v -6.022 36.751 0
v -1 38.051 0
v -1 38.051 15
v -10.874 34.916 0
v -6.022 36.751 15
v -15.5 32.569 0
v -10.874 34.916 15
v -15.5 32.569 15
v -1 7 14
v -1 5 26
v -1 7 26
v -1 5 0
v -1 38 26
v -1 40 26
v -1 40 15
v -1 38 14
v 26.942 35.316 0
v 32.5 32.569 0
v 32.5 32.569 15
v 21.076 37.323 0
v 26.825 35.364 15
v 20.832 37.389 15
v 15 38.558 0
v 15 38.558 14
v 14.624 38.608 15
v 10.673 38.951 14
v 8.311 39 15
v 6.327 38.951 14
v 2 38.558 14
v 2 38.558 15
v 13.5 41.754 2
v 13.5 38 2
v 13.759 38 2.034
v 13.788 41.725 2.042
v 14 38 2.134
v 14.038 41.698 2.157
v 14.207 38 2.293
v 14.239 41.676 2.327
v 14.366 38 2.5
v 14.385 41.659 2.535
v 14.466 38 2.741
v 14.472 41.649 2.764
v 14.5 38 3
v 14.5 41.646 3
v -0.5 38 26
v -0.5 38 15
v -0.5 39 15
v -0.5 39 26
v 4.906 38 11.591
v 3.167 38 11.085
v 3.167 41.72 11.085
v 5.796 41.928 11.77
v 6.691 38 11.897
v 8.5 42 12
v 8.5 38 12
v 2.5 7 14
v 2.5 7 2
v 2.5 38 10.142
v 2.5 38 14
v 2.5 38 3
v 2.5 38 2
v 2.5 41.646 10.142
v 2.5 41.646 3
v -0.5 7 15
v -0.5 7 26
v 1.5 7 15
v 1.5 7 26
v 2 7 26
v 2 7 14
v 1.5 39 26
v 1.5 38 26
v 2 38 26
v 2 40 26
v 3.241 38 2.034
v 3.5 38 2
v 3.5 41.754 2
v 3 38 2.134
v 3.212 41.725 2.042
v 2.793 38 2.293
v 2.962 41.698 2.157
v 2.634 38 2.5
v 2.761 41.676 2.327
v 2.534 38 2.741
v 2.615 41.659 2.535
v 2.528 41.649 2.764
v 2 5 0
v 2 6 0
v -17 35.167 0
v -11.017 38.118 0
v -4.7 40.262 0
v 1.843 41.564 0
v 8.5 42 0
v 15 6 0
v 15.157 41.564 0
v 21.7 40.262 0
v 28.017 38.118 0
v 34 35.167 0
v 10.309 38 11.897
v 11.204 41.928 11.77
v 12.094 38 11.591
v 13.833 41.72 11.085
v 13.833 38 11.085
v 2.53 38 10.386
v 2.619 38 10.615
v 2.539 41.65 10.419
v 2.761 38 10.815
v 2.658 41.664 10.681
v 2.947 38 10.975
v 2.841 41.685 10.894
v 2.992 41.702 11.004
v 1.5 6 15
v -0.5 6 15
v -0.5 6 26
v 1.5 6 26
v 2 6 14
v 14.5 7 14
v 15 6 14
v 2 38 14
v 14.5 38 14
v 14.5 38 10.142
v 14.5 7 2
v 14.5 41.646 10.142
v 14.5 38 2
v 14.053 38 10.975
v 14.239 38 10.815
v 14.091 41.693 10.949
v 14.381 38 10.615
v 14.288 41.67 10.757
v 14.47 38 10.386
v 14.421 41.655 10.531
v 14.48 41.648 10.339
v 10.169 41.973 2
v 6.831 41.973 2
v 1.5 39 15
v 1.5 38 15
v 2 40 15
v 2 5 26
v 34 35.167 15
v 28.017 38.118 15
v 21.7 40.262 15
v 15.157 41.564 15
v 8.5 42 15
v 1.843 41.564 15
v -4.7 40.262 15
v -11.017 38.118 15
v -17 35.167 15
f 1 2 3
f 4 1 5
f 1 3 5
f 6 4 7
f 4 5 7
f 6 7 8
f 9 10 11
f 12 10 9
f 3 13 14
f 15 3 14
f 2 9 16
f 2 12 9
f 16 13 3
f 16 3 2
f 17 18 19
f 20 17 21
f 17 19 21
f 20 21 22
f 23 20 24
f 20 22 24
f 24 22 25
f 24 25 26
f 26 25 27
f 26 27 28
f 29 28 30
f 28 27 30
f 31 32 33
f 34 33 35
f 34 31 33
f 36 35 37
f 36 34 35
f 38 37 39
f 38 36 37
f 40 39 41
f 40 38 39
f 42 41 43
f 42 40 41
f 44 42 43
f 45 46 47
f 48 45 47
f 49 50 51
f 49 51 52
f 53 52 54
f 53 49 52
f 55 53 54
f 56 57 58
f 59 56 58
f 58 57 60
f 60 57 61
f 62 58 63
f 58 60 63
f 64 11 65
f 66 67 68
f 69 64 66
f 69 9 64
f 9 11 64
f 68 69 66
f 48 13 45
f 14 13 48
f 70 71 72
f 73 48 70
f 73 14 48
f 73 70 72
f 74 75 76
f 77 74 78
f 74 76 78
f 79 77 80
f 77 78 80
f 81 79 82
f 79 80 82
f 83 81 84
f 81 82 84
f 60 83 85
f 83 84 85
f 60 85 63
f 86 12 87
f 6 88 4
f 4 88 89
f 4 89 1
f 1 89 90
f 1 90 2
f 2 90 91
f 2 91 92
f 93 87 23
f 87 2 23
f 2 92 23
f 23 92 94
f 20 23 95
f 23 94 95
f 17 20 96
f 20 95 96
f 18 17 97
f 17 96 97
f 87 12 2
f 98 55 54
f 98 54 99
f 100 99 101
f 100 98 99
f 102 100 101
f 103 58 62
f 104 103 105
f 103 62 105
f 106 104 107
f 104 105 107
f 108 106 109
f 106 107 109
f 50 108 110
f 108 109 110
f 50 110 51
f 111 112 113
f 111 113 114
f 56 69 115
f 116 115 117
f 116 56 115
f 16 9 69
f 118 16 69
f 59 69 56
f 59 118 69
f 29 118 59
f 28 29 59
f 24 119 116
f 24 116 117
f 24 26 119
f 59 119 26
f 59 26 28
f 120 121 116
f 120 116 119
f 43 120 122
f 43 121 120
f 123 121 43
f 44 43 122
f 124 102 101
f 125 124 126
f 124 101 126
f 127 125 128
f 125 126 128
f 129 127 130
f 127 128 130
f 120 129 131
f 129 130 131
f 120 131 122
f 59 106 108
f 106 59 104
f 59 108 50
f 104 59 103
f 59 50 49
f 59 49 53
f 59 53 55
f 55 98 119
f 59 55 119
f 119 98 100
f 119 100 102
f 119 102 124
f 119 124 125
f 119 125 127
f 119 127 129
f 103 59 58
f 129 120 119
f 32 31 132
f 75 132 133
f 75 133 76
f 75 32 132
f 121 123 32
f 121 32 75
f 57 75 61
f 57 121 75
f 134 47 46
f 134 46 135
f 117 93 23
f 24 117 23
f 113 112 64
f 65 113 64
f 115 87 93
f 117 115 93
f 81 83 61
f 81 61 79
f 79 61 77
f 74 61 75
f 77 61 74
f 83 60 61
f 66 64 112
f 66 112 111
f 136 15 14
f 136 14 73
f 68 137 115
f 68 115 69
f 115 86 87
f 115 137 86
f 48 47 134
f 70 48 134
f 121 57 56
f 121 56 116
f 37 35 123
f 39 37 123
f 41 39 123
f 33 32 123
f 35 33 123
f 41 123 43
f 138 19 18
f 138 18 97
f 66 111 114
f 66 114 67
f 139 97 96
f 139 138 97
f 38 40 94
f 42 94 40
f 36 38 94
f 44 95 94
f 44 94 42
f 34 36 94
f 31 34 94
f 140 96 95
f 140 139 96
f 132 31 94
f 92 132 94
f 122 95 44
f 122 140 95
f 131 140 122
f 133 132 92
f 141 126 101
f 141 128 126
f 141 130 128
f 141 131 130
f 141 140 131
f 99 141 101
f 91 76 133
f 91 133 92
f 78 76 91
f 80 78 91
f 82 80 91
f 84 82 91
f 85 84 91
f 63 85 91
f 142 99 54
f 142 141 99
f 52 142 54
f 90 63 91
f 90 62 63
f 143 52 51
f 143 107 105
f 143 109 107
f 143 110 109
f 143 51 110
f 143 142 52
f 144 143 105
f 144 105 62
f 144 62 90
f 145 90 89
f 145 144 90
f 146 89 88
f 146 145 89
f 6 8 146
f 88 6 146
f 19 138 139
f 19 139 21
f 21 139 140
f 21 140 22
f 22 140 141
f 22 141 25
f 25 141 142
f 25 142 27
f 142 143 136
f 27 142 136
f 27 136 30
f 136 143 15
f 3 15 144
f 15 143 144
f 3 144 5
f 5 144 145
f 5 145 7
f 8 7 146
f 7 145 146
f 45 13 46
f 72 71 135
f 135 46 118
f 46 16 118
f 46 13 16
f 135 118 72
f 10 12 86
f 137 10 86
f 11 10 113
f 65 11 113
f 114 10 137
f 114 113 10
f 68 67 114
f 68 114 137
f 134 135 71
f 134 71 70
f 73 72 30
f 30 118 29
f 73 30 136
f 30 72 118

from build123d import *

# Parameters (mm, degrees)
BOX004_W                    = 3
BOX004_H                    = 31
BOX004_DEPTH                = 14
BOX003_W                    = 2
BOX003_H                    = 33
BOX003_DEPTH                = 11.2
BOX002_W                    = 3
BOX002_H                    = 35
BOX002_DEPTH                = 26
EXTRUDE_DEPTH               = 5
EXTRUDE001_DEPTH            = 5
THICKNESS_T                 = 1
BOX_W                       = 12
BOX_H                       = 31
BOX_DEPTH                   = 15
BOX001_W                    = 13
BOX001_H                    = 34
BOX001_DEPTH                = 14
CYLINDER001_W               = 48
CYLINDER001_H               = 15
CYLINDER001_ANGLE           = 60
CYLINDER001_PLACEMENT_ANGLE = 60
CYLINDER_W                  = 51
CYLINDER_H                  = 15
CYLINDER_ANGLE              = 60
CYLINDER_PLACEMENT_ANGLE    = 60


with BuildPart() as slot_wall_cutout2:
    # Box004 → Box004 (new body)
    with BuildSketch(Plane(origin=(-1, 7, 14), x_dir=(1, 0, 0), z_dir=(0, 0, 1))):
        with Locations((1.5, 15.5)):
            Rectangle(BOX004_W, BOX004_H)
    extrude(amount=BOX004_DEPTH)


with BuildPart() as slot_wall_cutout1:
    # Box003 → Box003 (new body)
    with BuildSketch(Plane(origin=(-0.5, 6, 15), x_dir=(1, 0, 0), z_dir=(0, 0, 1))):
        with Locations((1, 16.5)):
            Rectangle(BOX003_W, BOX003_H)
    extrude(amount=BOX003_DEPTH)


with BuildPart() as wall_slot_finished:
    # Box002 → Box002 (new body)
    with BuildSketch(Plane(origin=(-1, 5, 0), x_dir=(1, 0, 0), z_dir=(0, 0, 1))):
        with Locations((1.5, 17.5)):
            Rectangle(BOX002_W, BOX002_H)
    extrude(amount=BOX002_DEPTH)

    # Cut003: cut slot wall cutout1
    add(slot_wall_cutout1.part, mode=Mode.SUBTRACT)

    # Cut004: cut slot wall cutout2
    add(slot_wall_cutout2.part, mode=Mode.SUBTRACT)


with BuildPart() as extrude_body:
    # Common_cs → Extrude (new body)
    with BuildSketch(Plane(origin=(8.5, 45, 6), x_dir=(1, 0, 0), z_dir=(0, 1, 0))):
        with BuildLine():
            Line((5, 4), (-5, 4))
            Line((-5, 4), (-5, -3.142136))
            ThreePointArc((-5, -3.142136), (-2.53653, -3.783978), (0, -4))
            ThreePointArc((0, -4), (2.53653, -3.783978), (5, -3.142136))
            Line((5, -3.142136), (5, 4))
        make_face()
    extrude(amount=EXTRUDE_DEPTH)


with BuildPart() as extrude001:
    # Common_cs001 → Extrude001 (new body)
    with BuildSketch(Plane(origin=(8.5, 45, 6), x_dir=(1, 0, 0), z_dir=(0, 1, 0))):
        with BuildLine():
            Line((5, 4), (-5, 4))
            Line((-5, 4), (-5, -3.142136))
            ThreePointArc((-5, -3.142136), (-2.53653, -3.783978), (0, -4))
            ThreePointArc((0, -4), (2.53653, -3.783978), (5, -3.142136))
            Line((5, -3.142136), (5, 4))
        make_face()
    extrude(amount=EXTRUDE001_DEPTH)


with BuildPart() as bolt_bottle_side_opening:
    # Thickness base: copy of Extrude body
    add(extrude_body.part)

    # Thickness
    thickness_openings = [bolt_bottle_side_opening.faces().sort_by_distance(p)[0] for p in [
        (8.5, 50, 5.862901),
    ]]
    offset(amount=THICKNESS_T, openings=thickness_openings)

    # Fusion: union Extrude body, Extrude001
    add(extrude_body.part)
    add(extrude001.part)


with BuildPart() as bolt_bottle_side_opening_1:
    # Fusion placement: moved
    add(bolt_bottle_side_opening.part.moved(Location((0, -7, 1))))


with BuildPart() as pullbay:
    # Box → Box (new body)
    with BuildSketch(Plane(origin=(2.5, 7, 2), x_dir=(1, 0, 0), z_dir=(0, 0, 1))):
        with Locations((6, 15.5)):
            Rectangle(BOX_W, BOX_H)
    extrude(amount=BOX_DEPTH)


with BuildPart() as cut_bay_from_case:
    # Box001 → Box001 (new body)
    with BuildSketch(Plane(origin=(2, 6, 0), x_dir=(1, 0, 0), z_dir=(0, 0, 1))):
        with Locations((6.5, 17)):
            Rectangle(BOX001_W, BOX001_H)
    extrude(amount=BOX001_DEPTH)

    # Cut001: cut pullBay
    add(pullbay.part, mode=Mode.SUBTRACT)


with BuildPart() as bottle_wall001:
    # Cylinder001 → Cylinder001 (revolve)
    with BuildSketch(Plane.XZ):
        with Locations((24, 7.5)):
            Rectangle(CYLINDER001_W, CYLINDER001_H)
    revolve(axis=Axis((0, 0, 0), (0, 0, 1)), revolution_arc=CYLINDER001_ANGLE)


with BuildPart() as bottle_wall001_1:
    # Cylinder001 placement: moved
    add(bottle_wall001.part.moved(Location((8.5, -7, 0))).rotate(Axis((8.5, -7, 0), (0, 0, 1)), CYLINDER001_PLACEMENT_ANGLE))


with BuildPart() as fusion002:
    # Cylinder → Cylinder (revolve)
    with BuildSketch(Plane.XZ):
        with Locations((25.5, 7.5)):
            Rectangle(CYLINDER_W, CYLINDER_H)
    revolve(axis=Axis((0, 0, 0), (0, 0, 1)), revolution_arc=CYLINDER_ANGLE)


with BuildPart() as fusion002_1:
    # Cylinder placement: moved
    add(fusion002.part.moved(Location((8.5, -7, 0))).rotate(Axis((8.5, -7, 0), (0, 0, 1)), CYLINDER_PLACEMENT_ANGLE))

    # Cut: cut bottle_wall001
    add(bottle_wall001_1.part, mode=Mode.SUBTRACT)


with BuildPart() as fusion002_2:
    # Cut placement: moved
    add(fusion002_1.part.moved(Location((0, -2, 0))))

    # Fusion001: union cut bay from case
    add(cut_bay_from_case.part)

    # Cut002: cut bolt_bottle_side_opening
    add(bolt_bottle_side_opening_1.part, mode=Mode.SUBTRACT)

    # Fusion002: union wall slot finished
    add(wall_slot_finished.part)


solid = fusion002_2.part
